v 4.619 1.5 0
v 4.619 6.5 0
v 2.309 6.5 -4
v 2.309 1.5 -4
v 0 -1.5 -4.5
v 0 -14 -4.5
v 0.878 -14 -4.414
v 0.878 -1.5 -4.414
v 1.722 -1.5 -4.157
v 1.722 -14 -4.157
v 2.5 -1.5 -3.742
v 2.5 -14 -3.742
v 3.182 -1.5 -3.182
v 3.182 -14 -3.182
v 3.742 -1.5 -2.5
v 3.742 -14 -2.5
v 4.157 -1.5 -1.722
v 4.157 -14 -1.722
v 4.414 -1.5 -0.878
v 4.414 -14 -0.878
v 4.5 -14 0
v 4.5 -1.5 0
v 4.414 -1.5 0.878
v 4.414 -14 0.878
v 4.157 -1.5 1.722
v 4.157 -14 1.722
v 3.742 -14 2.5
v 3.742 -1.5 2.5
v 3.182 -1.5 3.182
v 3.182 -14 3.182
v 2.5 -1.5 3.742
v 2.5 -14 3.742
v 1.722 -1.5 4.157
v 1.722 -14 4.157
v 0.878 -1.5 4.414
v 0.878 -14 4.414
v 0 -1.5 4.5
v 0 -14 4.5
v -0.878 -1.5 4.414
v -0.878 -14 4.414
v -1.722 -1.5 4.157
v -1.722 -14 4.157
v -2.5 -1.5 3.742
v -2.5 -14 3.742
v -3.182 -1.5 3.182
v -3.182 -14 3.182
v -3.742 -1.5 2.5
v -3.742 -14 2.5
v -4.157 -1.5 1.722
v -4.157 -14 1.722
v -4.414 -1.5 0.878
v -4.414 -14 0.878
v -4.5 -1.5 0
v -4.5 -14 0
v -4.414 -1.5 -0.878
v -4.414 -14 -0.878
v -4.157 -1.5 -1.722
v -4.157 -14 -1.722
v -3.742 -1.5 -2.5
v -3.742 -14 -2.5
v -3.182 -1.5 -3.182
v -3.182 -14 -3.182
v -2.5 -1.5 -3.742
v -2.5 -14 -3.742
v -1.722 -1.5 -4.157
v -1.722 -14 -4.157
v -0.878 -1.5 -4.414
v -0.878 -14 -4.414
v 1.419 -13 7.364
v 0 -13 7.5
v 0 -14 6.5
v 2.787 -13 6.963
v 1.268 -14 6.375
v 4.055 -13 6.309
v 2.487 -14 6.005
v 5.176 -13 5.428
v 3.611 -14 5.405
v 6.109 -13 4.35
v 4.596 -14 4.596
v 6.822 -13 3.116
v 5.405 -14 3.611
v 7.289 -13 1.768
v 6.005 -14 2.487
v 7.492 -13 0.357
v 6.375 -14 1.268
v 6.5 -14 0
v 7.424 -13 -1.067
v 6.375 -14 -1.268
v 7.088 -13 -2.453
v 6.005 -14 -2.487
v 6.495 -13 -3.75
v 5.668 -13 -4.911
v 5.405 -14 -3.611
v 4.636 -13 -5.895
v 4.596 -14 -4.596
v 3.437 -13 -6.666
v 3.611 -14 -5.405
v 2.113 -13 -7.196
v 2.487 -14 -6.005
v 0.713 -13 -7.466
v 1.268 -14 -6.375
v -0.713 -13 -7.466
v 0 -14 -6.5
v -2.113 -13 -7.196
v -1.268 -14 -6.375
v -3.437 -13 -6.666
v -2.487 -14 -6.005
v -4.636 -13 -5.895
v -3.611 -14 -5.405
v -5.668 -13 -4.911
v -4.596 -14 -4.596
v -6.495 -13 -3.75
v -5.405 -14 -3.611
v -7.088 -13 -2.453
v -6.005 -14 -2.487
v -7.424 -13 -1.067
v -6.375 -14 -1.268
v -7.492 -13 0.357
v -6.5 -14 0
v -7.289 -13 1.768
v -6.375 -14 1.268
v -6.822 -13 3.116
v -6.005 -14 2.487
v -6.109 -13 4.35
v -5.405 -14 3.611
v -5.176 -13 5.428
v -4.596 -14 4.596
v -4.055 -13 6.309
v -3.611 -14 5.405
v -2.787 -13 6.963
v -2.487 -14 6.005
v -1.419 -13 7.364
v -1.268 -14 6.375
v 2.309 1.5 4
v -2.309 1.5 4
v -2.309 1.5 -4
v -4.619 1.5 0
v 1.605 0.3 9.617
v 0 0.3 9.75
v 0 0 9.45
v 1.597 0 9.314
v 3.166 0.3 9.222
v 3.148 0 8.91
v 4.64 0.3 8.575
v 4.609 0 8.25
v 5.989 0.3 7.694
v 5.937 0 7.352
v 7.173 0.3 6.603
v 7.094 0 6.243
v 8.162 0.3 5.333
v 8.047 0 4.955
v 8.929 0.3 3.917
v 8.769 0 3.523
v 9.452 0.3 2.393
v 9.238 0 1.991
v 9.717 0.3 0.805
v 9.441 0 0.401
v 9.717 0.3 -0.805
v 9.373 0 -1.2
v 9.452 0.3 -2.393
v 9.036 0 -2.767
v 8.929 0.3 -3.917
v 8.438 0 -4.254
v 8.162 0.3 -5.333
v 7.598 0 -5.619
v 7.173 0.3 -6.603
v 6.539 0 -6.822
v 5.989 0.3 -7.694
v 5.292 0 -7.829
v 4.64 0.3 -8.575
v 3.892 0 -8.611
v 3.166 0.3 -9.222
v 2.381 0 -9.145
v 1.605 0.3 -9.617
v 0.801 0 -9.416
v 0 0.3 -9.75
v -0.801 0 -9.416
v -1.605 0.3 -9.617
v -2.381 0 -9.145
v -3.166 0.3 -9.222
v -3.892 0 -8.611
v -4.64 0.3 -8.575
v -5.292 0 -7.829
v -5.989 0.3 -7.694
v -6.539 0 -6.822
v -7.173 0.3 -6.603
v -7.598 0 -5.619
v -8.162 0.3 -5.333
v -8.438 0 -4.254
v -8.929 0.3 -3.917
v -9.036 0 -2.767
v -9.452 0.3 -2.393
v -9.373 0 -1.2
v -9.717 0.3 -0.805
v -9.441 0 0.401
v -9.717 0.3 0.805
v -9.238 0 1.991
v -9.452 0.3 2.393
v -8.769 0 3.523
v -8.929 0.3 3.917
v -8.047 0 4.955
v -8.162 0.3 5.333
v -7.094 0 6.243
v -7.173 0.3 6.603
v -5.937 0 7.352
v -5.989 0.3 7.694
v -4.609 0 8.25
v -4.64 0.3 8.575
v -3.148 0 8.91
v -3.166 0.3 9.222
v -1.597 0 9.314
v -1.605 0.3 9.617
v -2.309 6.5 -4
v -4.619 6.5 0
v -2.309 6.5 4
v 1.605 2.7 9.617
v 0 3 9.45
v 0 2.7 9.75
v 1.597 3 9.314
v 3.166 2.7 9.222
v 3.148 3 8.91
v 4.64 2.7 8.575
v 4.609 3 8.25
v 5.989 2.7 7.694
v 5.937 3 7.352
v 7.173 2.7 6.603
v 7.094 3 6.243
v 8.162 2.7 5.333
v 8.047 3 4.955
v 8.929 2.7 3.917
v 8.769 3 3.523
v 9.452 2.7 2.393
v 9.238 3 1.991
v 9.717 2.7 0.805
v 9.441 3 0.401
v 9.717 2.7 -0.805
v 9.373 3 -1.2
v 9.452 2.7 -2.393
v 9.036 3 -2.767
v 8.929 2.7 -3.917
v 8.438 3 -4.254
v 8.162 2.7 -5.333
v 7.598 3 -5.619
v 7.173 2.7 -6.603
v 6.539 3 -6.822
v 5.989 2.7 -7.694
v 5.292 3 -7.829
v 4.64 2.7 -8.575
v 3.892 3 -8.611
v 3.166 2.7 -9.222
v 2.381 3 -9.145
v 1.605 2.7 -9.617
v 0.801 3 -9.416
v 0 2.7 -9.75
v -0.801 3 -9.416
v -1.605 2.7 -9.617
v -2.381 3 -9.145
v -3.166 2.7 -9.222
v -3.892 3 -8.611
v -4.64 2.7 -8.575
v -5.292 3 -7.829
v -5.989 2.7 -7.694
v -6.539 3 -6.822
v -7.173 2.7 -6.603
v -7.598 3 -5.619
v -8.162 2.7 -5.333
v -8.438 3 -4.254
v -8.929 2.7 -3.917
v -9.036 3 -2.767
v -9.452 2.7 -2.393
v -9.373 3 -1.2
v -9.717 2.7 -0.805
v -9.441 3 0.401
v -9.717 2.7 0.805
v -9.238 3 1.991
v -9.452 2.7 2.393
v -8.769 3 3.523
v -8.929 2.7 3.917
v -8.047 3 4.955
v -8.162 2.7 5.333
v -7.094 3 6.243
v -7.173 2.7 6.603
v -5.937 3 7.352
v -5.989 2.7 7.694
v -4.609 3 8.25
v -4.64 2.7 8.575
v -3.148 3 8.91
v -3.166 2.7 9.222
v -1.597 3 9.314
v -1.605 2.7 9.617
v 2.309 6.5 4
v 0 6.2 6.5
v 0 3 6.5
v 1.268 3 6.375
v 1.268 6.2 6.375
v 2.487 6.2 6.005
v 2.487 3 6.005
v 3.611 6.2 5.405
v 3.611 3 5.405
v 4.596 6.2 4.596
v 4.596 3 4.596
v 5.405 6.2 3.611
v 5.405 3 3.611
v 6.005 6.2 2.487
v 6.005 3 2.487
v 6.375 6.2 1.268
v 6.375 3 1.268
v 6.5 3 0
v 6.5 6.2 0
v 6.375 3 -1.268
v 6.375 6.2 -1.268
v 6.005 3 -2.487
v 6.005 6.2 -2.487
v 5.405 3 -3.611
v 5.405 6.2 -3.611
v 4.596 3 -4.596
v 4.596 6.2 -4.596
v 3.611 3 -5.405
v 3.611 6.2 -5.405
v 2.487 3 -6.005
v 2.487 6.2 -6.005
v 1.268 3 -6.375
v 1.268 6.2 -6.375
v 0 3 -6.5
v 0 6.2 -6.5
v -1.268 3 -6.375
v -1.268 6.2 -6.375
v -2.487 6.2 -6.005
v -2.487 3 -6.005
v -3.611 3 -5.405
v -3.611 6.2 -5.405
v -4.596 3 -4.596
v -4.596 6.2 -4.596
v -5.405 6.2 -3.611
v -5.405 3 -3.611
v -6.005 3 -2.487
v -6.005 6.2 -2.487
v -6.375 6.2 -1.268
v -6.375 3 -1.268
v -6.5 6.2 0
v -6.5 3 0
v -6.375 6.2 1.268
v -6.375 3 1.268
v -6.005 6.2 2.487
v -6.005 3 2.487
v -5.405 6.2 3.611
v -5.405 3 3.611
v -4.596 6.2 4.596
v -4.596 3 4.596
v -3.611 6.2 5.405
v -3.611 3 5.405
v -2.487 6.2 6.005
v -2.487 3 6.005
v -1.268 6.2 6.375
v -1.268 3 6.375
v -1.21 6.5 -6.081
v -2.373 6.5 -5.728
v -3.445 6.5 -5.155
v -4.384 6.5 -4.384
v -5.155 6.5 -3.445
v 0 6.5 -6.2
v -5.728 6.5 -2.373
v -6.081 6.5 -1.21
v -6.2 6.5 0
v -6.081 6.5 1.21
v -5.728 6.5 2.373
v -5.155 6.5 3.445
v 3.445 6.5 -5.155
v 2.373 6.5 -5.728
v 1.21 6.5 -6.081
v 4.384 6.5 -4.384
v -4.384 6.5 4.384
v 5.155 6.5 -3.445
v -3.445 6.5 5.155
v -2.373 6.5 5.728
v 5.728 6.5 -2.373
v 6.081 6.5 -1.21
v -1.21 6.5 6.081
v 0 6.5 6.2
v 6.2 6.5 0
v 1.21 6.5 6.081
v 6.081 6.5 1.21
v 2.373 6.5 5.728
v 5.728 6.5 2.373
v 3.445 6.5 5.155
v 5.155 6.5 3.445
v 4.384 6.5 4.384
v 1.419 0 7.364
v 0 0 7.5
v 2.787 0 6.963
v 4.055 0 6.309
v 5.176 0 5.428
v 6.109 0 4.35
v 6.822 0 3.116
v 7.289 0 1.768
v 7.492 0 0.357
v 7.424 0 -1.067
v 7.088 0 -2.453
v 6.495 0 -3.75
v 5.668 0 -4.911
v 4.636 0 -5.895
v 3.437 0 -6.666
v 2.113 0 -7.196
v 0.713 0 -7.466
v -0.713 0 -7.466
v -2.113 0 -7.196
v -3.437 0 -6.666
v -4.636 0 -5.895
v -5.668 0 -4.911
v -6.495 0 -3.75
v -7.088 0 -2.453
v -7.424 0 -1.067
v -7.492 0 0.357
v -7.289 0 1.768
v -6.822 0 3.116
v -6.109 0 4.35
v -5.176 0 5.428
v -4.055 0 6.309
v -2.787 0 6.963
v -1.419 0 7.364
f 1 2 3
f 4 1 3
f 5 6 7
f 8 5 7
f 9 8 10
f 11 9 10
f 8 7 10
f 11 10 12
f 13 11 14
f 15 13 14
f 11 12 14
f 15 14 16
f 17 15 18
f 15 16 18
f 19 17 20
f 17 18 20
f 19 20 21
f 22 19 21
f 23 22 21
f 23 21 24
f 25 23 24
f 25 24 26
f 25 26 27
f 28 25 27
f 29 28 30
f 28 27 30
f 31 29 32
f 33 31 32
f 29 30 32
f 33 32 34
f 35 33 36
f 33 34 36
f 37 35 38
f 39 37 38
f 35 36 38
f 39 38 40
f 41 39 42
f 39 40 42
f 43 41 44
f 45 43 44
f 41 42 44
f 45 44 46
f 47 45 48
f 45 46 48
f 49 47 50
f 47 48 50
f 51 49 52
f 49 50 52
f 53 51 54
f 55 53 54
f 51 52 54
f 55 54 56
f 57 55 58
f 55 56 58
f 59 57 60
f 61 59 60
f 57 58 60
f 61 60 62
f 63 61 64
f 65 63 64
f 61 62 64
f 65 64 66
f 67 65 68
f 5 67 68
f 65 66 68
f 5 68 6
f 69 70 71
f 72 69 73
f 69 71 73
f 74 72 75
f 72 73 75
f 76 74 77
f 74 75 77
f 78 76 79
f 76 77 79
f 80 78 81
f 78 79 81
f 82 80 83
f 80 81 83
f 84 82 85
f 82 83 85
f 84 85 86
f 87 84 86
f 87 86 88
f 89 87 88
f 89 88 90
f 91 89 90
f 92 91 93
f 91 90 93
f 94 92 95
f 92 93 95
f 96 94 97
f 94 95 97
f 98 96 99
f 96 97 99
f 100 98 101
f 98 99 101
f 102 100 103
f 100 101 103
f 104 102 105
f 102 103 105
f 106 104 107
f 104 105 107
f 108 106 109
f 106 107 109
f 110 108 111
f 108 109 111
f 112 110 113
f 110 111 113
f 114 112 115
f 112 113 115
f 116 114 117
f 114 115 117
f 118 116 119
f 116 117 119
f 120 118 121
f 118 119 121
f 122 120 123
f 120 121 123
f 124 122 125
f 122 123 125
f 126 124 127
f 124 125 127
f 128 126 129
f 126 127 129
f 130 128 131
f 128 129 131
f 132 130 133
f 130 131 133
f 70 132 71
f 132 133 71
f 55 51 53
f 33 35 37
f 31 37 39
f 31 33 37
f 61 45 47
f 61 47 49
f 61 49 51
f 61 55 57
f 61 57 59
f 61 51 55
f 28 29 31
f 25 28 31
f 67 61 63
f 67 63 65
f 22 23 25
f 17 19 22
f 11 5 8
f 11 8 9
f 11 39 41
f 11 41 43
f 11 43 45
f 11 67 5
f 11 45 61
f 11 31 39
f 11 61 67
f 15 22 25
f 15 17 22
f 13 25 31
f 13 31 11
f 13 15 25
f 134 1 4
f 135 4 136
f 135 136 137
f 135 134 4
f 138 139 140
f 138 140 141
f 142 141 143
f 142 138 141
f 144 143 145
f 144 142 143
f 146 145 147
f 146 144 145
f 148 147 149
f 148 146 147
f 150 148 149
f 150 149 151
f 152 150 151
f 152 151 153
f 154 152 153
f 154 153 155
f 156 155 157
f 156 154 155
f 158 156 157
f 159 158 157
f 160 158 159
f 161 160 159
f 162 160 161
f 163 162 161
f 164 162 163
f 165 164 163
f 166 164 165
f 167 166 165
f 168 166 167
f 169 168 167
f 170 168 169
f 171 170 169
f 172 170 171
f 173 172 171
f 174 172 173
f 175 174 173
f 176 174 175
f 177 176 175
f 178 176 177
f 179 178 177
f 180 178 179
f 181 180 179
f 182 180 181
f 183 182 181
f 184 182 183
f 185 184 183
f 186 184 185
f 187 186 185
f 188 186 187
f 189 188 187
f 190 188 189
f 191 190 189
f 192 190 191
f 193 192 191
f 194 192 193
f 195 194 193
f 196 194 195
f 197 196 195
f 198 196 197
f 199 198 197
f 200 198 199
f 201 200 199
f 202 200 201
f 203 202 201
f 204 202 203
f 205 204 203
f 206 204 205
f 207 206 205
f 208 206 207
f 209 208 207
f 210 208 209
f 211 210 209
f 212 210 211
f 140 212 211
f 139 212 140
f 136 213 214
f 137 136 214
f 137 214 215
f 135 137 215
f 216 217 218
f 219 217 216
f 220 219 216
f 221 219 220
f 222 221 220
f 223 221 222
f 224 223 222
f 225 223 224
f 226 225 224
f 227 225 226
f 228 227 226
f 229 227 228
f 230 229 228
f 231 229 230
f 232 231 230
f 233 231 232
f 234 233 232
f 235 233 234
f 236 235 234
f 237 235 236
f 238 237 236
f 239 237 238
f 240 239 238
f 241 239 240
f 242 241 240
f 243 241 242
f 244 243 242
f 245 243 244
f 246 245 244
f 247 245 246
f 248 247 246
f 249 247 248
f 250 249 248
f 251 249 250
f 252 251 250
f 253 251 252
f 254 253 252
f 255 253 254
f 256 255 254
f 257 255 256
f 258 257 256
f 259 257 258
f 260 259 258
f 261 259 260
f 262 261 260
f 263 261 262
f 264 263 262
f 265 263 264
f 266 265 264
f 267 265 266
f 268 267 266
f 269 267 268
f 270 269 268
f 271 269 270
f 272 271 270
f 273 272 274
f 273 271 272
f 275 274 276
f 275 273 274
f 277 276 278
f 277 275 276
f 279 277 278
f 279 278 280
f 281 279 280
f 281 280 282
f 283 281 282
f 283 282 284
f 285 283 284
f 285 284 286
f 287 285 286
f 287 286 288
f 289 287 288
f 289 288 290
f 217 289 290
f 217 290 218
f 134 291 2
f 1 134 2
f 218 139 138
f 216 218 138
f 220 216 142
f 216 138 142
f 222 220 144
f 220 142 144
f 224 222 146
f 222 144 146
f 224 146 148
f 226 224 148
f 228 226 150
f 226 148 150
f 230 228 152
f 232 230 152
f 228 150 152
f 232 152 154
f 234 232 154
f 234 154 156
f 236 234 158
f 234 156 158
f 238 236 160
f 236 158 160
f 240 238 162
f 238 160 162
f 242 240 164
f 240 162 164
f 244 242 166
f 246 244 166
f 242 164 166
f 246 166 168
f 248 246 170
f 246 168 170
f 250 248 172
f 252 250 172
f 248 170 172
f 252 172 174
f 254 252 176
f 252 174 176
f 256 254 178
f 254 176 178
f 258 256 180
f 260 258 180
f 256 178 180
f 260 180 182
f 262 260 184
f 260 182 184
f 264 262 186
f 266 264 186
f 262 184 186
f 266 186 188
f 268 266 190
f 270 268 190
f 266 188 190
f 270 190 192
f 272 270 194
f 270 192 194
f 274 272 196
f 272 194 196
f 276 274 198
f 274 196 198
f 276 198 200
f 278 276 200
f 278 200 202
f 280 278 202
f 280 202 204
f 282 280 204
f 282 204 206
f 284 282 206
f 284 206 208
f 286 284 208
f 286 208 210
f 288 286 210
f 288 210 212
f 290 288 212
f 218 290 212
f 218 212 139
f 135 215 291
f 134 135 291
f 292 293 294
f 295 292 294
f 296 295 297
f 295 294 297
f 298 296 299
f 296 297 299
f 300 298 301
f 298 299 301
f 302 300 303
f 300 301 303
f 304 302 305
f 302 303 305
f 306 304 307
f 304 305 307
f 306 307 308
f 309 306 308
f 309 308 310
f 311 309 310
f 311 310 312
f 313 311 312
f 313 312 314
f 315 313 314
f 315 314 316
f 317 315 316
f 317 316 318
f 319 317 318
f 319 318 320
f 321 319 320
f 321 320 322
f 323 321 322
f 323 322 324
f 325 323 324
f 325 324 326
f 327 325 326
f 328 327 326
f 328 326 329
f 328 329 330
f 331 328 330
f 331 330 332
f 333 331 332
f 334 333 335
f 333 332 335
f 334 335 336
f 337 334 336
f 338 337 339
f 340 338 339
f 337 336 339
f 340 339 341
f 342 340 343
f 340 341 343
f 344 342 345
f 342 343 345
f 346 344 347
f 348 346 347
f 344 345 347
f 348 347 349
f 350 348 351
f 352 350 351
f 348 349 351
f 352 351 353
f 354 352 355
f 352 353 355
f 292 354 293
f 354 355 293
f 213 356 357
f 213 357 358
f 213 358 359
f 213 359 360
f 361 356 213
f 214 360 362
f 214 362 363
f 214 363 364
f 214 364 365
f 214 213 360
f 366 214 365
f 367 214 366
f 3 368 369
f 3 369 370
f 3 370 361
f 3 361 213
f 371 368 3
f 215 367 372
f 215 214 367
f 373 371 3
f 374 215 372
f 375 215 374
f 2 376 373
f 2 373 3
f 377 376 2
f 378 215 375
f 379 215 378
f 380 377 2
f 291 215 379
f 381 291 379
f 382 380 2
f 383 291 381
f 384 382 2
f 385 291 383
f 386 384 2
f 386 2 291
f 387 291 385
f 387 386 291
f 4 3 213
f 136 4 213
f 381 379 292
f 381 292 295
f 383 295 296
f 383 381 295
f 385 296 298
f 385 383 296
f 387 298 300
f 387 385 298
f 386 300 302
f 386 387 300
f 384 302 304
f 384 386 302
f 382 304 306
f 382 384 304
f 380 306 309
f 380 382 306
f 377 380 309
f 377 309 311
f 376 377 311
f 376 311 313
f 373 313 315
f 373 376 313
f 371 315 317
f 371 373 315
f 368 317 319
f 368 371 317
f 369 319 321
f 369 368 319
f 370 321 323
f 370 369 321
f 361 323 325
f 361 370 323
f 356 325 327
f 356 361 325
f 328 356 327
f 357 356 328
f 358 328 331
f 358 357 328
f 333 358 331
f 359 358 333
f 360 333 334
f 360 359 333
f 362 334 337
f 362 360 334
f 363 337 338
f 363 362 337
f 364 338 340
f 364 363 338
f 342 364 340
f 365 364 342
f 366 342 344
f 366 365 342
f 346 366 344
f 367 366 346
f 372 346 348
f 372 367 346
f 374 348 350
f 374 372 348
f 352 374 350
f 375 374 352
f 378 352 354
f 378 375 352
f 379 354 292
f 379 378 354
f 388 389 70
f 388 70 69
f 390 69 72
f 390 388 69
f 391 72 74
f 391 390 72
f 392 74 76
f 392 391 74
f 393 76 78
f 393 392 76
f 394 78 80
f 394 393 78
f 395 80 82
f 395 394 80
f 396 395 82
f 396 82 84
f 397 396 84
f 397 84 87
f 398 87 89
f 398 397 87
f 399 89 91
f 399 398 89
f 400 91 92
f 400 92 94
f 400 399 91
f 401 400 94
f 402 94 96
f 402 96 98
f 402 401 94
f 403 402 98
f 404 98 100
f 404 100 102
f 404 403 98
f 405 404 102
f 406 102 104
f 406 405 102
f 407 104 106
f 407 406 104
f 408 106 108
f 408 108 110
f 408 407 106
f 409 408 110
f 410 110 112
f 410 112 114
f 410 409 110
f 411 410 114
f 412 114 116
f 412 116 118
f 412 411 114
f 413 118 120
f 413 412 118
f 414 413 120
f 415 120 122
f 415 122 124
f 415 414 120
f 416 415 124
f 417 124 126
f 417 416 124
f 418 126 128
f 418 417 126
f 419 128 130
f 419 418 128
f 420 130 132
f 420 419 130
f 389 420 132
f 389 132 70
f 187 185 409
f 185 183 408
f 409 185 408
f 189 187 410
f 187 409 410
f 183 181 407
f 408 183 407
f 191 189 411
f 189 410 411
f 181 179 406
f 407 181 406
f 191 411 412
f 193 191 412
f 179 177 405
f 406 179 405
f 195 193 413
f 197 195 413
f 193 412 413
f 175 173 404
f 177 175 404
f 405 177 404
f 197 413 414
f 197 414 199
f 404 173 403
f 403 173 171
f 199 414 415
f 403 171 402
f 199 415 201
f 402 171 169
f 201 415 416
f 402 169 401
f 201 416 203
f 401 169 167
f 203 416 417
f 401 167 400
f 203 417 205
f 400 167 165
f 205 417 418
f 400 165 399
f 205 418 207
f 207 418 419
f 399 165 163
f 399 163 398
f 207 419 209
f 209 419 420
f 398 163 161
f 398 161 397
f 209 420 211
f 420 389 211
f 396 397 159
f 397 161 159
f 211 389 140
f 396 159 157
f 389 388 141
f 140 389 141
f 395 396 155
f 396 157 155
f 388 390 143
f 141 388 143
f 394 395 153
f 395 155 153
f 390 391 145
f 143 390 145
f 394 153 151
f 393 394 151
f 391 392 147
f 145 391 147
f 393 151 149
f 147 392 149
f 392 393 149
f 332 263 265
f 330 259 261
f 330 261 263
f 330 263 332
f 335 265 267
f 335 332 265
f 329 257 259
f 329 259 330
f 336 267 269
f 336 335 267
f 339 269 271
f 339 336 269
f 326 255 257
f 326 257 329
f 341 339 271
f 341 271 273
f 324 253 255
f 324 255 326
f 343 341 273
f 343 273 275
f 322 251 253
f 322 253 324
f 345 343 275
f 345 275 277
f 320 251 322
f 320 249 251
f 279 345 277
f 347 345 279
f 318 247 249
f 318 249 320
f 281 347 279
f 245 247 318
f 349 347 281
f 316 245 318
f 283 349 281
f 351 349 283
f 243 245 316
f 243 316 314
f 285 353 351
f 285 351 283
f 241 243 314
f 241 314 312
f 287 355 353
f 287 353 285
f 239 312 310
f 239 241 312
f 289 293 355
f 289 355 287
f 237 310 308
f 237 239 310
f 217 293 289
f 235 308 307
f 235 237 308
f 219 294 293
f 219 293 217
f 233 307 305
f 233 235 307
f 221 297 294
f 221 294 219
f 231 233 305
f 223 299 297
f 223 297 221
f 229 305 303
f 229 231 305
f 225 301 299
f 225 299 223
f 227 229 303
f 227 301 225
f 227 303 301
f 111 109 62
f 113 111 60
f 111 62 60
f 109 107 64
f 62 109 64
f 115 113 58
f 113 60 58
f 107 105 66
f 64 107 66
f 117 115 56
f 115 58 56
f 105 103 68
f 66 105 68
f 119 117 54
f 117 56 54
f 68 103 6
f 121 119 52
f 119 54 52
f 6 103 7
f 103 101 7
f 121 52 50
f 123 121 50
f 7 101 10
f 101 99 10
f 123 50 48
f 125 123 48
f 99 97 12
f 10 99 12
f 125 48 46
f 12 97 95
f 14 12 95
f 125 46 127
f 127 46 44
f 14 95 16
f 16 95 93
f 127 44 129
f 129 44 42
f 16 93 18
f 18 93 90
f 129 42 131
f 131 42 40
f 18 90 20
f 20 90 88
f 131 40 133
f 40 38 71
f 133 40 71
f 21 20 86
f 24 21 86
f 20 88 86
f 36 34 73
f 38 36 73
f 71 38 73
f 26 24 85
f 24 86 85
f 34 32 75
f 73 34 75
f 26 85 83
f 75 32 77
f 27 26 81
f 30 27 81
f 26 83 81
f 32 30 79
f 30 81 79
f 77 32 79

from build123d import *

# Parameters (mm, degrees)
ESQUISSE1_R             = 7.5
EXTRUSION1_DEPTH        = 14
ESQUISSE2_R             = 9.75
EXTRUSION2_DEPTH        = 3
ESQUISSE3_R             = 6.5
EXTRUSION3_DEPTH        = 6.5
ESQUISSE4_R             = 4.5
ENL_V_MAT_EXTRU_1_DEPTH = 12.5
ENL_V_MAT_EXTRU_2_DEPTH = 5
CHANFREIN1_SIZE         = 1
CHANFREIN2_SIZE         = 0.3


with BuildPart() as part:
    # Esquisse1 → Extrusion1 (new body)
    with BuildSketch(Plane(origin=(0, 0, 0), x_dir=(1, 0, 0), z_dir=(0, 1, 0))):
        with Locations(Location((0, 0, 0), (0, 0, 270))):  # turned: the seam where the file's is
            Circle(ESQUISSE1_R)
    extrude(amount=-EXTRUSION1_DEPTH)

    # Esquisse2 → Extrusion2 (add)
    with BuildSketch(Plane(origin=(0, 0, 0), x_dir=(-1, 0, 0), z_dir=(0, 1, 0))):
        with Locations(Location((0, 0, 0), (0, 0, 90))):  # turned: the seam where the file's is
            Circle(ESQUISSE2_R)
    extrude(amount=EXTRUSION2_DEPTH)

    # Esquisse3 → Extrusion3 (add)
    with BuildSketch(Plane(origin=(0, 0, 0), x_dir=(1, 0, 0), z_dir=(0, 1, 0))):
        with Locations(Location((0, 0, 0), (0, 0, 270))):  # turned: the seam where the file's is
            Circle(ESQUISSE3_R)
    extrude(amount=EXTRUSION3_DEPTH)

    # Esquisse4 → Enlèv. mat.-Extru.1 (cut)
    with BuildSketch(Plane.XZ.offset(14)):
        with Locations(Location((0, 0, 0), (0, 0, 270))):  # turned: the seam where the file's is
            Circle(ESQUISSE4_R)
    extrude(amount=-ENL_V_MAT_EXTRU_1_DEPTH, mode=Mode.SUBTRACT)

    # Esquisse5 → Enlèv. mat.-Extru.2 (cut)
    with BuildSketch(Plane(origin=(0, 6.5, 0), x_dir=(-1, 0, 0), z_dir=(0, 1, 0))):
        Polygon((-4.618802154, 0), (-2.309401077, -4), (2.309401077, -4), (4.618802154, 0), (2.309401077, 4), (-2.309401077, 4), align=None)
    extrude(amount=-ENL_V_MAT_EXTRU_2_DEPTH, mode=Mode.SUBTRACT)

    # Chanfrein1
    chanfrein1_edges = [part.edges().sort_by_distance(p)[0] for p in [
        (0, -14, -7.5),
    ]]
    chamfer(chanfrein1_edges, length=CHANFREIN1_SIZE)

    # Chanfrein2
    chanfrein2_edges = [part.edges().sort_by_distance(p)[0] for p in [
        (0, 6.5, -6.5),
        (0, 0, -9.75),
        (0, 3, -9.75),
    ]]
    chamfer(chanfrein2_edges, length=CHANFREIN2_SIZE)


solid = part.part
